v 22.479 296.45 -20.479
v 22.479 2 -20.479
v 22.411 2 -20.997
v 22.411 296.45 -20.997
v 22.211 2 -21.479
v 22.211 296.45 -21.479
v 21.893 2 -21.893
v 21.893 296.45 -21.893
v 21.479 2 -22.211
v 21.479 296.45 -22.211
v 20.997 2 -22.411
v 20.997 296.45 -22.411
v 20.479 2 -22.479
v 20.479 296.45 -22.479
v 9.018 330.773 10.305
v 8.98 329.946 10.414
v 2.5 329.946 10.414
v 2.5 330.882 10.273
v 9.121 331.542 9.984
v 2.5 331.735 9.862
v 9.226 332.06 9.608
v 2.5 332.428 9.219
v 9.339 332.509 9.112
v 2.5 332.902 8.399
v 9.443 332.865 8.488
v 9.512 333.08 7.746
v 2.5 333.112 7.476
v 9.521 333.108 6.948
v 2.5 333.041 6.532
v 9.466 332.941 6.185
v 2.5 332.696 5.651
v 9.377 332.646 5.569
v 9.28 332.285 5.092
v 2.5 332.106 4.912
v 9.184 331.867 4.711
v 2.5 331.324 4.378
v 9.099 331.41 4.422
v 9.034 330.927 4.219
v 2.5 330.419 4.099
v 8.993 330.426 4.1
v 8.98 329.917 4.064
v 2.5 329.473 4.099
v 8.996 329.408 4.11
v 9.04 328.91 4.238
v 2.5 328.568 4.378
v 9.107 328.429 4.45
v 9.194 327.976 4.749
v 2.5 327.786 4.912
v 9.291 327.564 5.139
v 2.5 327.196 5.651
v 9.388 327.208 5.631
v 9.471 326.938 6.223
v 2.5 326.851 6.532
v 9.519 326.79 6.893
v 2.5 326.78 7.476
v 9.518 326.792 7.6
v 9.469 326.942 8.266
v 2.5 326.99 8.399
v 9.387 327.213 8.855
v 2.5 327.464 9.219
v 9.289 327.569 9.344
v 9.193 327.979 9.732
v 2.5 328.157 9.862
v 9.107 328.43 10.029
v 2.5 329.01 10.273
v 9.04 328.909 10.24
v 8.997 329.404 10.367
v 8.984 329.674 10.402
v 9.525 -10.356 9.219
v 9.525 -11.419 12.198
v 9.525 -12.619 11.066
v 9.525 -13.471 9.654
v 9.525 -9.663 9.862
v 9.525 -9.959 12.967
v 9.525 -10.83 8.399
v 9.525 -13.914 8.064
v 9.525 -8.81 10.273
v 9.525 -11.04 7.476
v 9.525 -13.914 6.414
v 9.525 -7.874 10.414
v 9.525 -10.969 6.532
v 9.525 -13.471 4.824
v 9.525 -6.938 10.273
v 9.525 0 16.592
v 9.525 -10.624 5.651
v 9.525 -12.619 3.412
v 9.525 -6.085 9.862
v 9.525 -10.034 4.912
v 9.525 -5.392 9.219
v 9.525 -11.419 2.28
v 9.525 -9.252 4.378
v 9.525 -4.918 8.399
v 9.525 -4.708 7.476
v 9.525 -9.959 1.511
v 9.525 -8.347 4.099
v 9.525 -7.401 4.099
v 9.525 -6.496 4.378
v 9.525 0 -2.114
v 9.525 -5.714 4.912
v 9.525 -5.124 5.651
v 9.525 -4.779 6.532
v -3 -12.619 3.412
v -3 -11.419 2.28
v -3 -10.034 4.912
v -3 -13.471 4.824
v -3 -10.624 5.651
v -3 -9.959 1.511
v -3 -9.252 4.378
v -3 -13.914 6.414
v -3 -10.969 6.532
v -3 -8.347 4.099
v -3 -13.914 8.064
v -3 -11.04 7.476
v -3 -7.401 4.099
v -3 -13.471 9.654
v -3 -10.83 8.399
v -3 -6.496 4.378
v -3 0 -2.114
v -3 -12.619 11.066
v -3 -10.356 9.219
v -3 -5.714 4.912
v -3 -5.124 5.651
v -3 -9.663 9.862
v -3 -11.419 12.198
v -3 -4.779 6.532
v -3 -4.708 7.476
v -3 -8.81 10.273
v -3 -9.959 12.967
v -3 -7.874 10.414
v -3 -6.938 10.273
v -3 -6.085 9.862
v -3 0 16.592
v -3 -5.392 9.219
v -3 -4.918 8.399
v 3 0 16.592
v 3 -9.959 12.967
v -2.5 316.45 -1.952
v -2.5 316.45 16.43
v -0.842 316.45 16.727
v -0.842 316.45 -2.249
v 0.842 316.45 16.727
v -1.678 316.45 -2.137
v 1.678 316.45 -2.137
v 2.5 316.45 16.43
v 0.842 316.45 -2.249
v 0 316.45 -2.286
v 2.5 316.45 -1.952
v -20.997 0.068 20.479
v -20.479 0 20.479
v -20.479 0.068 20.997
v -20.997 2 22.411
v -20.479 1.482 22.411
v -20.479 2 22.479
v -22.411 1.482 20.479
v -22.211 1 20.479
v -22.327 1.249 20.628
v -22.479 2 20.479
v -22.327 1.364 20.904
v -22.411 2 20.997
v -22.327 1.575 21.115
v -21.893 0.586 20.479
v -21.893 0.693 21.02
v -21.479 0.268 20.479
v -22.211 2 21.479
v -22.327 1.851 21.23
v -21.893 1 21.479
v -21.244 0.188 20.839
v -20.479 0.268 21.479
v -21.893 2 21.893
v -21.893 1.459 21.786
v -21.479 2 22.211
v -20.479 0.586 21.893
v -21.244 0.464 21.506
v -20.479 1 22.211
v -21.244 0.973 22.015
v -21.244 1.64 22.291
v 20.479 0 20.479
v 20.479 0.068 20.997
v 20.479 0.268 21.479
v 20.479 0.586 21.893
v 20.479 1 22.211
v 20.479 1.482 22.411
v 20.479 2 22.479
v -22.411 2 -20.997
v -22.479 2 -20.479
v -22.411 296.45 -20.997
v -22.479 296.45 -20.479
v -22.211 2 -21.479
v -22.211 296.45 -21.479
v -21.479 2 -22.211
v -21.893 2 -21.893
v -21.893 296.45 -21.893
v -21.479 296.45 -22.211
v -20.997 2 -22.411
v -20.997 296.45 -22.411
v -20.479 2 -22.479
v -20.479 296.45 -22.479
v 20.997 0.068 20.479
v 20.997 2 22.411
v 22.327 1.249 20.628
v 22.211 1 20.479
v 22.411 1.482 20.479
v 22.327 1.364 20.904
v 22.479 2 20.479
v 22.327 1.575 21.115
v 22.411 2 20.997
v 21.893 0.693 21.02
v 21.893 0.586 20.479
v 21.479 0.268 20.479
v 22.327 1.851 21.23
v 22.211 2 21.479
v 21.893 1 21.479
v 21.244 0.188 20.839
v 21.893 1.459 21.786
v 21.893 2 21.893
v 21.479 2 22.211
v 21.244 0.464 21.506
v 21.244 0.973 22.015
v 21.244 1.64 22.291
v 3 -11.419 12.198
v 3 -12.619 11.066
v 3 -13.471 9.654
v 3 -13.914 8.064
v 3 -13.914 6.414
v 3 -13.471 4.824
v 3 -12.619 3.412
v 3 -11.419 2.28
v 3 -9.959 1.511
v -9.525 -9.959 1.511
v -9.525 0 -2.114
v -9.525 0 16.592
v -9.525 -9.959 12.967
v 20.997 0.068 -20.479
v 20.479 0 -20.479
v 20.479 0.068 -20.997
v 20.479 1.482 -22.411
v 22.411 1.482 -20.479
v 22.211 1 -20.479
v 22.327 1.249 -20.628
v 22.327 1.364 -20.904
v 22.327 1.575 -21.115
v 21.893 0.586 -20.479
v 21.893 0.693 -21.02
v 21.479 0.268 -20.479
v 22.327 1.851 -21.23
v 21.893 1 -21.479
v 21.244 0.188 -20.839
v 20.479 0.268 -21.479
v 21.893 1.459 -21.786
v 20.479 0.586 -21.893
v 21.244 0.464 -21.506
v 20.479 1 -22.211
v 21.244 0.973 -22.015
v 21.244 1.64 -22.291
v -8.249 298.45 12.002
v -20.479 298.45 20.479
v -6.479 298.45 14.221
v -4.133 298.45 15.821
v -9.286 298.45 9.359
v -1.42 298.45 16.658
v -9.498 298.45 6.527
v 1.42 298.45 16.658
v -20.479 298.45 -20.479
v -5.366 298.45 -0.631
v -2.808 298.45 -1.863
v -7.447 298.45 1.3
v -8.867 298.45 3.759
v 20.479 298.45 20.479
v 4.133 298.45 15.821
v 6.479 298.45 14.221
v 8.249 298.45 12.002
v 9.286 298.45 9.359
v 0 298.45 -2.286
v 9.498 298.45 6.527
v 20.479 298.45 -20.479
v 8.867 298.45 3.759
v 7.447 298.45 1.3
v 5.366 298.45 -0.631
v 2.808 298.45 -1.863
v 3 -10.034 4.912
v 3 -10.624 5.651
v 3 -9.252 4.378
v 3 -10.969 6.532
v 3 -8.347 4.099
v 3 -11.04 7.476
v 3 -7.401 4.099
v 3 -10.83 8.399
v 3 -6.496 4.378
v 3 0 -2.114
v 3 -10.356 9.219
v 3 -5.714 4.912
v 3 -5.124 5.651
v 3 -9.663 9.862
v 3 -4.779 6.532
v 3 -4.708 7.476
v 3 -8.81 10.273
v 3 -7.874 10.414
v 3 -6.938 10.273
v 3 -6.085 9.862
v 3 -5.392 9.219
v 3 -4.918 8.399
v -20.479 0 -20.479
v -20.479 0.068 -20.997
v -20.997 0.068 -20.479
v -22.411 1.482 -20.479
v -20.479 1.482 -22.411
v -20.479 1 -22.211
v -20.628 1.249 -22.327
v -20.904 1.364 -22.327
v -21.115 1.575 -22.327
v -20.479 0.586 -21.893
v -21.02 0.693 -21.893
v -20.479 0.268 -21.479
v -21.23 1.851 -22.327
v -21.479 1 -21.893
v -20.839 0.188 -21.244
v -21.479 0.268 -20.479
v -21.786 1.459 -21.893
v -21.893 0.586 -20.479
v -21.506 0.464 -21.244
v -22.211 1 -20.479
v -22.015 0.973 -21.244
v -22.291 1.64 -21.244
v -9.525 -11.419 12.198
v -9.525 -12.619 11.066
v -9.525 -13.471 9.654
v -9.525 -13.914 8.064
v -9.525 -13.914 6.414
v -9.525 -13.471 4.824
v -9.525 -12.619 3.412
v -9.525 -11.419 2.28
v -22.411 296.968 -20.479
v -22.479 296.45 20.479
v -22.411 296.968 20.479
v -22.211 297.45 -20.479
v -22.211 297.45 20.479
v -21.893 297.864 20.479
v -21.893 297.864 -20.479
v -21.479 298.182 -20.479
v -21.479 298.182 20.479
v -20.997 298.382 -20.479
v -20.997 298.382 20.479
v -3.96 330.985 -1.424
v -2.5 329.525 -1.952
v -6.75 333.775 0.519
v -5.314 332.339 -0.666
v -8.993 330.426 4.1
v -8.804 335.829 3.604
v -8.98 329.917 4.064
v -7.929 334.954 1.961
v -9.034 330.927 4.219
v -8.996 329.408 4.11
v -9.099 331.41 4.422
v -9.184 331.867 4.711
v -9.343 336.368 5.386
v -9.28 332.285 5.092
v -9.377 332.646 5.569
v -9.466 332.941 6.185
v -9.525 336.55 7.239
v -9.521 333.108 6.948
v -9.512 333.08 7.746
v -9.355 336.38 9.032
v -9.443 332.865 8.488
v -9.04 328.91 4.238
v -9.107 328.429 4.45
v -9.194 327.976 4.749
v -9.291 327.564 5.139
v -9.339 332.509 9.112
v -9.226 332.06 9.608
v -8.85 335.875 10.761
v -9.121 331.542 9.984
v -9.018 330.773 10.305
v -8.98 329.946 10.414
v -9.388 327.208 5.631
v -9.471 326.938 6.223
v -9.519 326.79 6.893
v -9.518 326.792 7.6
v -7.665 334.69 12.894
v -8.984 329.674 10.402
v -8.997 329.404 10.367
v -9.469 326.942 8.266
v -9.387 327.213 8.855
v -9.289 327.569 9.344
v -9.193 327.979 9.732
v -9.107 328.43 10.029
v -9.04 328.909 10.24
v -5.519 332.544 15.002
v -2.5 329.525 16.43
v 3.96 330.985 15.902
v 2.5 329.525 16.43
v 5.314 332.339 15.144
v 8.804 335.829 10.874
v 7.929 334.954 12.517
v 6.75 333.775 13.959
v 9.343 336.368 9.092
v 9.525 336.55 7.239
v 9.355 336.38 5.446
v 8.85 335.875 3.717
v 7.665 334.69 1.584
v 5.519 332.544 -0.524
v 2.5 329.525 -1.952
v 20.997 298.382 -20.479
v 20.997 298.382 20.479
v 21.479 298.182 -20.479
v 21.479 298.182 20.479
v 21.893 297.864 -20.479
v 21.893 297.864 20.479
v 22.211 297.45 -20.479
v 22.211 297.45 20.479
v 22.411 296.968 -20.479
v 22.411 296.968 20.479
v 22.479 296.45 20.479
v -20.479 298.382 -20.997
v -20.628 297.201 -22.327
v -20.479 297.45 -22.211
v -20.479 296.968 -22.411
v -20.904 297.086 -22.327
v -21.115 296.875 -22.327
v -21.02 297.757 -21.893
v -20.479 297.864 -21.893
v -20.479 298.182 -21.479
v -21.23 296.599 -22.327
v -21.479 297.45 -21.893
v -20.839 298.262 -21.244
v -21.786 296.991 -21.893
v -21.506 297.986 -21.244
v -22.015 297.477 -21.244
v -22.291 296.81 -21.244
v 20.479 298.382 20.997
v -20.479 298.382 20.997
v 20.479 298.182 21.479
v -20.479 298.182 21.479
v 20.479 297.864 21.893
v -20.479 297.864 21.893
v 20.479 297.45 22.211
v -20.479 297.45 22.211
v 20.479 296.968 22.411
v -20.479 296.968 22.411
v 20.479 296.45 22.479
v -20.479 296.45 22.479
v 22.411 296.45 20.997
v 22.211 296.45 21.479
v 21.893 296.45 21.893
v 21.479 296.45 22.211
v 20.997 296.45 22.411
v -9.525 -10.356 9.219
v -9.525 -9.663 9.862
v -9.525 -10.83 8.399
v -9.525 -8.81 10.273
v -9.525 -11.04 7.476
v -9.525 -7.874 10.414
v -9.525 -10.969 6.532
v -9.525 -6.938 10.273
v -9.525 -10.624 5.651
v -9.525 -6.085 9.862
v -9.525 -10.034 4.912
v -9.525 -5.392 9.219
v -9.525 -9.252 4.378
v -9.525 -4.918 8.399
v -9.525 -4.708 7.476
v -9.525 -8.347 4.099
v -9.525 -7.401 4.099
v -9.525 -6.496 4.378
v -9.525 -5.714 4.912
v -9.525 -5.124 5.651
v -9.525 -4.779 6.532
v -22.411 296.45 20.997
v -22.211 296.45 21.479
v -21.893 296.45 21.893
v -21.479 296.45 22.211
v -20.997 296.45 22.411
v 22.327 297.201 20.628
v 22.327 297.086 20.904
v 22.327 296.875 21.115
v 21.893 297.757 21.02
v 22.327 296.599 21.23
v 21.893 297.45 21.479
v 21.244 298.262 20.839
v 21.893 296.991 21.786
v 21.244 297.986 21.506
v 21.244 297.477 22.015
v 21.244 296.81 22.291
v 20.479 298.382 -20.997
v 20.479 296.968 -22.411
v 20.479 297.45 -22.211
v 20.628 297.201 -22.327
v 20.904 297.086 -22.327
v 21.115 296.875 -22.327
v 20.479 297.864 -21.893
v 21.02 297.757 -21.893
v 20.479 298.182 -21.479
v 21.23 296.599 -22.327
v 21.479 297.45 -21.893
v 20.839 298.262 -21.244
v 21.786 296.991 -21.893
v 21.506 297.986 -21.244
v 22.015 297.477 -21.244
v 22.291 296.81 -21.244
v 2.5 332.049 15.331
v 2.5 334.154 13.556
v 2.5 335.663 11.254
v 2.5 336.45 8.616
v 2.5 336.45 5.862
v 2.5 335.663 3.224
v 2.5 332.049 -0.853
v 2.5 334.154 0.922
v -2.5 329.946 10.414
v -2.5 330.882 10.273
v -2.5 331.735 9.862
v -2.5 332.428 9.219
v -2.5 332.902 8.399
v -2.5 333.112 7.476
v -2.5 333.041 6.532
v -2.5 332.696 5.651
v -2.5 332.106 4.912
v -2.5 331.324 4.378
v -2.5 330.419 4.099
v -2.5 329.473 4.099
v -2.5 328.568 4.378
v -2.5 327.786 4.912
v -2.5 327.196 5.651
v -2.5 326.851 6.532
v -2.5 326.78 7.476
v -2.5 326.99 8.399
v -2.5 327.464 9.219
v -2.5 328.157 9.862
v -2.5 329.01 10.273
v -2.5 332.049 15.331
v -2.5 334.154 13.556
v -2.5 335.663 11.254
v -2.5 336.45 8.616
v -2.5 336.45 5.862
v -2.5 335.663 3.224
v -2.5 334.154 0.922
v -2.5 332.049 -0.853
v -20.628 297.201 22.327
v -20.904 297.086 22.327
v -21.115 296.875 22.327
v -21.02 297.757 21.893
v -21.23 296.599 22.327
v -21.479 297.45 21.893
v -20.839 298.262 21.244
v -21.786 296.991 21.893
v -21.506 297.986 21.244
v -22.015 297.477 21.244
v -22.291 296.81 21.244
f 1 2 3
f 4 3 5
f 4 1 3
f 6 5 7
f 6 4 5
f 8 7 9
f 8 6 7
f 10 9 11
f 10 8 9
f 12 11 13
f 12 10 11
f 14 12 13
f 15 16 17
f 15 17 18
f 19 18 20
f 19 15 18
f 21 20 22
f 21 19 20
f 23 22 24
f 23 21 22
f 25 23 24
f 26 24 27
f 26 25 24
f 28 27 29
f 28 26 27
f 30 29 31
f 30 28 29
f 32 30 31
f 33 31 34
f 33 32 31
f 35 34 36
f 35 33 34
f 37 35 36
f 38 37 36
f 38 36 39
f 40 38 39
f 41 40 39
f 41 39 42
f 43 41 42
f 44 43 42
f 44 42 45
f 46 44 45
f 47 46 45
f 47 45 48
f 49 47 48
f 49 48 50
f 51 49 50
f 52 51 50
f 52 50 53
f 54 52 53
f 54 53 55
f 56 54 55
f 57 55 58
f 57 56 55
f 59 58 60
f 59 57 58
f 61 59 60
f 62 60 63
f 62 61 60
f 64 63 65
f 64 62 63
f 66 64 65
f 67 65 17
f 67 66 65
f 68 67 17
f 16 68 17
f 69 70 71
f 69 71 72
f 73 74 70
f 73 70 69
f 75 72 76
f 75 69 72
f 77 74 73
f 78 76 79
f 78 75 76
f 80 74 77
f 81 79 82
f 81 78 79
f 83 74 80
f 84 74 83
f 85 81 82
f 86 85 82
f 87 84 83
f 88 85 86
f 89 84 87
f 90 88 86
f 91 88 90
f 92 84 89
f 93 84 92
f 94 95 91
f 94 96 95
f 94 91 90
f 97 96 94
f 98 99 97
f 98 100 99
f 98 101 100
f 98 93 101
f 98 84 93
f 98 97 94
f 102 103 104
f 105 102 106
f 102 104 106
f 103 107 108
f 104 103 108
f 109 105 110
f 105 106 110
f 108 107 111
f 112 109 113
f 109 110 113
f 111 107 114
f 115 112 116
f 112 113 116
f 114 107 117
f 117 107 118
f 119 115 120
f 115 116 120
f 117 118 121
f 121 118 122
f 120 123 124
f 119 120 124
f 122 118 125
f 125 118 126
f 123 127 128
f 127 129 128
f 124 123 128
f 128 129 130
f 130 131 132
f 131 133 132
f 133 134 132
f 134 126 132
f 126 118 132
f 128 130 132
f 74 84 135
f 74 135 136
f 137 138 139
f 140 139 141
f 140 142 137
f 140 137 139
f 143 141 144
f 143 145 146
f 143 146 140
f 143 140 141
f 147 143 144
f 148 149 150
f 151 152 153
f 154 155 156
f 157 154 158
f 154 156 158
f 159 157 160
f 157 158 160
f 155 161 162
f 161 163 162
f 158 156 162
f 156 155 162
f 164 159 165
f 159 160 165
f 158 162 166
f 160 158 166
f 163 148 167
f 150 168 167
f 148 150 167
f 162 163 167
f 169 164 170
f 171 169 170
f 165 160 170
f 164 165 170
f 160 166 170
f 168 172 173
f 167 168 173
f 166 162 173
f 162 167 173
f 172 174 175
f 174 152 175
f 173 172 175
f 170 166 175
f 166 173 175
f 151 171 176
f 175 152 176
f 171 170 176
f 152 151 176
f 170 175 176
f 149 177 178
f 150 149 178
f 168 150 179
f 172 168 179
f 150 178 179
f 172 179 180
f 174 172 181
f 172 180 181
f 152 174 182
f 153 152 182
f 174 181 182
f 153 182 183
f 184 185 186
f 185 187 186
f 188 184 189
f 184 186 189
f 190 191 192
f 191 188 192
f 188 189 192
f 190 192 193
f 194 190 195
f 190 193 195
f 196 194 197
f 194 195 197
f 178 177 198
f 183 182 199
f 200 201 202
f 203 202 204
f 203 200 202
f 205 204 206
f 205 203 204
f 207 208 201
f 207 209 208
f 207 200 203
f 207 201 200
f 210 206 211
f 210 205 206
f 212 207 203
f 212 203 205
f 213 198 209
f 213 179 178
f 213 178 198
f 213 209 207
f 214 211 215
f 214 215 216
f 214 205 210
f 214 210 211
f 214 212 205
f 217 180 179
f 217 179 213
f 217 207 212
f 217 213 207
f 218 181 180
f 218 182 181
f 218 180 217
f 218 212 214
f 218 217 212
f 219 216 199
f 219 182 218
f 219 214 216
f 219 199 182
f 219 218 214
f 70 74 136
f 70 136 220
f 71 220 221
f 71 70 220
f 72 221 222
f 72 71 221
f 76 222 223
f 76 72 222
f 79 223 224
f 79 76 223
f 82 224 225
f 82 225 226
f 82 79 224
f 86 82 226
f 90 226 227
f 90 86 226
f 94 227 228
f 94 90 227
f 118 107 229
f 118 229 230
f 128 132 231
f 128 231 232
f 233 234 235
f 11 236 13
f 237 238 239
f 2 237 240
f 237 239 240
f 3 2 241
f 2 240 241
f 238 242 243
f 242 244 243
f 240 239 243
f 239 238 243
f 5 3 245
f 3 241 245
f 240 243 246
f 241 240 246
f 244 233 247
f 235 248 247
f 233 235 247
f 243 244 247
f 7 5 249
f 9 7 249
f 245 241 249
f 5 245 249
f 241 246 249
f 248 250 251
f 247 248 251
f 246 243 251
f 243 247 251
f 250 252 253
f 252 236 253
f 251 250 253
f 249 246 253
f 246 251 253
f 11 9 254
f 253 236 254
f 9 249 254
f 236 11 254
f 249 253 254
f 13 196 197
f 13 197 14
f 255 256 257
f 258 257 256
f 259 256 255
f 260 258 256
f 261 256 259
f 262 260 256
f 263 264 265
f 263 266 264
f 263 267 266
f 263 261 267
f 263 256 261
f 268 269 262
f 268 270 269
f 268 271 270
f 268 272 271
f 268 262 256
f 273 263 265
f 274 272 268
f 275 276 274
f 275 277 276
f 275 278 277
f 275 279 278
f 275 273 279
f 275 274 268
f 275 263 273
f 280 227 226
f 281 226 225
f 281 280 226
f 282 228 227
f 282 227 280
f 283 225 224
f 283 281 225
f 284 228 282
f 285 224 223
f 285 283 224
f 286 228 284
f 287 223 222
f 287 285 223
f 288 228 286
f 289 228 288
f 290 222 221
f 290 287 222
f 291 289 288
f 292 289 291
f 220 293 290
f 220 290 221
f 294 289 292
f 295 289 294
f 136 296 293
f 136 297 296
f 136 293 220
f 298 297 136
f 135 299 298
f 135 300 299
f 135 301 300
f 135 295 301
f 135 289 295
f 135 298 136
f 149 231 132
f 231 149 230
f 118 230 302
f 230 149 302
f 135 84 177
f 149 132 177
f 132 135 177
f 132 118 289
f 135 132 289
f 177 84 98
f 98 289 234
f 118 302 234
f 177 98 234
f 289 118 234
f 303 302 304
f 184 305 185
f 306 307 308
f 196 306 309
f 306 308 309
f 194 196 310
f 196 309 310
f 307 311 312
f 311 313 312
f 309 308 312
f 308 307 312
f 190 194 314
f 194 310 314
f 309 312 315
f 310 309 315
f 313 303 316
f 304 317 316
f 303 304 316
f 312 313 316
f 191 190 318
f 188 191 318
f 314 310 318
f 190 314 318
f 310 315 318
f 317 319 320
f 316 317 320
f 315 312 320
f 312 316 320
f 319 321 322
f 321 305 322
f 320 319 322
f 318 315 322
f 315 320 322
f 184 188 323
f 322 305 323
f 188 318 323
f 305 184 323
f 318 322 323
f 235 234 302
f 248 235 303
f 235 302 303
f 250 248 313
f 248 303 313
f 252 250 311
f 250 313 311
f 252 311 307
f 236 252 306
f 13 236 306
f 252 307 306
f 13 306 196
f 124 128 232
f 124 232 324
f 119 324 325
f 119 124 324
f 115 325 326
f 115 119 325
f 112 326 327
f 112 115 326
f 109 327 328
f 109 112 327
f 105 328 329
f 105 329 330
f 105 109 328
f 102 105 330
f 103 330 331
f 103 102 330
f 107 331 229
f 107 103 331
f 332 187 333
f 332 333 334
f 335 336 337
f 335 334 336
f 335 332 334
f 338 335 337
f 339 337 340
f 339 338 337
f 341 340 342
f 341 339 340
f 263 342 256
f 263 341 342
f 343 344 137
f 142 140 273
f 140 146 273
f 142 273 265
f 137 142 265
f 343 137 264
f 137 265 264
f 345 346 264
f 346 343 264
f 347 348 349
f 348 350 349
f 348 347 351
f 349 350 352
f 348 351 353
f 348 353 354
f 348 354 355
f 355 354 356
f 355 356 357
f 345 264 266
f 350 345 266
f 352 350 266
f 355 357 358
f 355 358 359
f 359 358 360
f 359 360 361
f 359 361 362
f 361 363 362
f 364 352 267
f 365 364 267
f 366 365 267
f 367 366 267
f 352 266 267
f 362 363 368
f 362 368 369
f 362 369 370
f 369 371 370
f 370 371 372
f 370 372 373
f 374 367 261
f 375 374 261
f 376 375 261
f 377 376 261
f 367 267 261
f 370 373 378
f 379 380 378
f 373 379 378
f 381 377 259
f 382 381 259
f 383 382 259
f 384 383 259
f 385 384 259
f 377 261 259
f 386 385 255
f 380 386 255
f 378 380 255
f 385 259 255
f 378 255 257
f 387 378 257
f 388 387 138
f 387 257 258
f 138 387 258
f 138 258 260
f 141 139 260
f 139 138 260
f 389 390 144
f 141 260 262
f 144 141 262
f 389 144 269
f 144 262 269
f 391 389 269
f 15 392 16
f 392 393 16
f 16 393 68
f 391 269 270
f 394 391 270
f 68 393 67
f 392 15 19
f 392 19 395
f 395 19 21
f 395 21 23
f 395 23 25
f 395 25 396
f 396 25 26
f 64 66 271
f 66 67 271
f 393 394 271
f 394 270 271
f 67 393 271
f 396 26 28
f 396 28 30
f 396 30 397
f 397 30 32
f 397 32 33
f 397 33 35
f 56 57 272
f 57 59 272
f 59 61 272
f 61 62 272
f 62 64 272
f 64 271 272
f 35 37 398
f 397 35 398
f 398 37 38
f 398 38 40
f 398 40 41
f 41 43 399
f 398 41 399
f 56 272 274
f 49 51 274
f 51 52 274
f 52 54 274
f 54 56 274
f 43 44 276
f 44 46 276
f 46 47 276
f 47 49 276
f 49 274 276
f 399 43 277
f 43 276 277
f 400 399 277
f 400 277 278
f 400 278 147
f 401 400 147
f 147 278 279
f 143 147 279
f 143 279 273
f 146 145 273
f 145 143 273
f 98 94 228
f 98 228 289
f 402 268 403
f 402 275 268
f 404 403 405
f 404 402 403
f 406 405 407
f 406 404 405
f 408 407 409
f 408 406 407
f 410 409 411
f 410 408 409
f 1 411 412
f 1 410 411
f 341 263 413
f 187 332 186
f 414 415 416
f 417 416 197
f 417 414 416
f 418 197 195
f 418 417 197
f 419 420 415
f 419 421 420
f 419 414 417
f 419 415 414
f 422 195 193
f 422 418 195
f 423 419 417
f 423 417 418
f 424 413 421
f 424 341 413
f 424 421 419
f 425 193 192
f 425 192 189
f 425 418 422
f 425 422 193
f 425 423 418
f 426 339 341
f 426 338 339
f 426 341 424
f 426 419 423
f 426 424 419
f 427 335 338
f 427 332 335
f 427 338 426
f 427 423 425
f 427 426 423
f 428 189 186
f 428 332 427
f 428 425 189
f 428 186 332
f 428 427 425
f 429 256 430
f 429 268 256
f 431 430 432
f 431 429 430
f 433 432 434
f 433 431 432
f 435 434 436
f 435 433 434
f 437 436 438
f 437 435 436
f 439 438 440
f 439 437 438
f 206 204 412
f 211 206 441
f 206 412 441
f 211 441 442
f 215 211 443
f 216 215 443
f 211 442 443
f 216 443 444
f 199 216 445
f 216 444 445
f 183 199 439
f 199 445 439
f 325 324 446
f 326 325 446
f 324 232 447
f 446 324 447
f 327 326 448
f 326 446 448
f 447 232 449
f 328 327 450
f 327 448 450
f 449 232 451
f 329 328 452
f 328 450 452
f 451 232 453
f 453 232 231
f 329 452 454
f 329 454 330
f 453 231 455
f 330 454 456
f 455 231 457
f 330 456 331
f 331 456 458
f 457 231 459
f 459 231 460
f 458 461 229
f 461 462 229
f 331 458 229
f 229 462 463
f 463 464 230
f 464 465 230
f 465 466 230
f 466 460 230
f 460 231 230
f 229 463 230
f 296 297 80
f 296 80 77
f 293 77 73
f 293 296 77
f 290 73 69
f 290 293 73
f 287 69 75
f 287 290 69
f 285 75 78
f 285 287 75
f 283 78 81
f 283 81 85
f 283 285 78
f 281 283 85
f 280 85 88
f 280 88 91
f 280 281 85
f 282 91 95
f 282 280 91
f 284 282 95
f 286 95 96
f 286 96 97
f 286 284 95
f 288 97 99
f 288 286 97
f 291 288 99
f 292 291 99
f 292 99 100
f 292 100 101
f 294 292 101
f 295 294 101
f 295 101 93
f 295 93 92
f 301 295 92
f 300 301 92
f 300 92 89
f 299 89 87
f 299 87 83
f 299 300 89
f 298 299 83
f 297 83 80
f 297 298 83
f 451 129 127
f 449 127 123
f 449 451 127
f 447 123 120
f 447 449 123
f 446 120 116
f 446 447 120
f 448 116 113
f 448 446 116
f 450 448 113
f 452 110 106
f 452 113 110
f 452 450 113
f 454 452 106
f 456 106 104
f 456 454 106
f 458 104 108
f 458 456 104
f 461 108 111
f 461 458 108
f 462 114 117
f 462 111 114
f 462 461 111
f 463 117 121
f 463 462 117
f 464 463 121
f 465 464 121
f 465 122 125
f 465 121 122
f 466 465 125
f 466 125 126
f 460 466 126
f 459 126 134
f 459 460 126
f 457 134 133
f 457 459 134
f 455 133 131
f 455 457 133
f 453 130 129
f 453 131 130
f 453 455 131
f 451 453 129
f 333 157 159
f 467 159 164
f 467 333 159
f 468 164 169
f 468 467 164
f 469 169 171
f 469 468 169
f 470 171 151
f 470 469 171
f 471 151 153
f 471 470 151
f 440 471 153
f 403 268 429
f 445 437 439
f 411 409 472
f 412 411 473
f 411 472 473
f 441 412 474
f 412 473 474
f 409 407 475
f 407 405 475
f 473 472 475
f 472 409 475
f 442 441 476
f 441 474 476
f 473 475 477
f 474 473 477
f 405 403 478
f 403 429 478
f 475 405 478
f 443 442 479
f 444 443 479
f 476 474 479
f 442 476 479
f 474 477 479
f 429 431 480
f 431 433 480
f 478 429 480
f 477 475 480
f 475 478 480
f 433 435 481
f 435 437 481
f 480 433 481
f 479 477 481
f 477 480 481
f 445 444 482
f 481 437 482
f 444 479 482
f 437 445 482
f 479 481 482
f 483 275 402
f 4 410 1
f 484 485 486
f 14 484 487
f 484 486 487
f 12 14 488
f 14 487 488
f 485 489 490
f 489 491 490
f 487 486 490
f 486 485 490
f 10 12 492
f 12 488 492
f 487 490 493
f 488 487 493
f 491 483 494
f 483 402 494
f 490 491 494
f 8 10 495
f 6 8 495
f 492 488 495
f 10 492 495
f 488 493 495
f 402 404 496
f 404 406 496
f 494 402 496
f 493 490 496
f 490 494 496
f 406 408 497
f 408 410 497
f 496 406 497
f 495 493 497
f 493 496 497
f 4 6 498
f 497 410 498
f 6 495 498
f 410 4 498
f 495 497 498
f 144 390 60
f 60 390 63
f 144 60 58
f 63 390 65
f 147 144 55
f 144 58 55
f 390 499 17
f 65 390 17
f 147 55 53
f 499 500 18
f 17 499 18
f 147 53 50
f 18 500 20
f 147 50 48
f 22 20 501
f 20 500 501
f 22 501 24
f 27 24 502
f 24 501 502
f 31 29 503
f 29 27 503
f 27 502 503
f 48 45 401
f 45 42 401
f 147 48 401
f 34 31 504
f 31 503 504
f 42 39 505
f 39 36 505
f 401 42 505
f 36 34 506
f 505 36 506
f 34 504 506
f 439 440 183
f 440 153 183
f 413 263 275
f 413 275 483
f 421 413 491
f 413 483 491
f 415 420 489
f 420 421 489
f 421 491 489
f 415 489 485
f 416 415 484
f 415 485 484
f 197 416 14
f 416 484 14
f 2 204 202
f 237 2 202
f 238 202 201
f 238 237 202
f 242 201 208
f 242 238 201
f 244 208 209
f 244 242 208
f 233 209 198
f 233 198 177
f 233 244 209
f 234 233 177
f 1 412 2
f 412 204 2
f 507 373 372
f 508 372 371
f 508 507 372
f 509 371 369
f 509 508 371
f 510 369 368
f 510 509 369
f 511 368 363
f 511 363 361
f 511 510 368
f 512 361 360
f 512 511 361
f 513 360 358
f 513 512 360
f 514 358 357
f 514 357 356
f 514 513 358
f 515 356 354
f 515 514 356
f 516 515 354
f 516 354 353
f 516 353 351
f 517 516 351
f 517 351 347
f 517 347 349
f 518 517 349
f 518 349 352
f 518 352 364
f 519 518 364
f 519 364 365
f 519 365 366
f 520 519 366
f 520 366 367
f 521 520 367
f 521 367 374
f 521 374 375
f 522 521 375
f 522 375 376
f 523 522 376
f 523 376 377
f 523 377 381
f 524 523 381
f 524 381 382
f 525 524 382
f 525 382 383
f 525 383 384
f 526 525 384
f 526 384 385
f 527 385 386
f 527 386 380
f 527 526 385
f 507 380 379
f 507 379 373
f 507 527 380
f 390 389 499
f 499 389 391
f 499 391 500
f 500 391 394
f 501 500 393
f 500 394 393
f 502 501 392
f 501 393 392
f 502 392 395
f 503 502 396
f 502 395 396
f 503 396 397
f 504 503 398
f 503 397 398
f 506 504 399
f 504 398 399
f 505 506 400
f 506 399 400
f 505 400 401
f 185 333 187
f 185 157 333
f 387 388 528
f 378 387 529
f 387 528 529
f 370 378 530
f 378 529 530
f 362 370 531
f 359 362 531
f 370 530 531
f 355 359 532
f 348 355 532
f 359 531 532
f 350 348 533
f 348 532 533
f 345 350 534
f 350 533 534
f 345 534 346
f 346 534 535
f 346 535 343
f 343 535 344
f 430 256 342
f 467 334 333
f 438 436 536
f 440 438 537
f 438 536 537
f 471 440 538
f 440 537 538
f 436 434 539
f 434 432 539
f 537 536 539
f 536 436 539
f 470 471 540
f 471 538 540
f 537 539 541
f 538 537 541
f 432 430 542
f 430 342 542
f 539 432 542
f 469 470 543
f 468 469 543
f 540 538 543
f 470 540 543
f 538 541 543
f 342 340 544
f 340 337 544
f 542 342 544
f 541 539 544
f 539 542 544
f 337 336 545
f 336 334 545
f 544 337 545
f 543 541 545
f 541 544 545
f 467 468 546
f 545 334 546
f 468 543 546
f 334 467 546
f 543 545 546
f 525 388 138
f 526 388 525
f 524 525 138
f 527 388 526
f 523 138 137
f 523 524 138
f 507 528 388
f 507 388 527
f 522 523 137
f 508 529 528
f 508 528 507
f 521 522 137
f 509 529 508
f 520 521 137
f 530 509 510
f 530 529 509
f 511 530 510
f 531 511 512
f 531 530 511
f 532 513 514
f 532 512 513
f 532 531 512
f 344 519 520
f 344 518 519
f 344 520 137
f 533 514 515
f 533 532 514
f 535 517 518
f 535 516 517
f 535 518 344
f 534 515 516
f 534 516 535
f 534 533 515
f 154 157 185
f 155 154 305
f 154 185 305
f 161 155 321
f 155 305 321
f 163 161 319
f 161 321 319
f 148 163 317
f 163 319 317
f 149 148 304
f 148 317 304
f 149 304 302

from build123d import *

# Parameters (mm, degrees)
SKETCH1_W               = 44.958
SKETCH1_H               = 44.958
BOSS_EXTRUDE1_DEPTH     = 298.45
SKETCH2_R               = 9.525
BOSS_EXTRUDE2_DEPTH     = 38.1
CUT_EXTRUDE1_DEPTH      = 341.282867193
CUT_EXTRUDE1_DEPTH_BACK = 341.282867193
CUT_EXTRUDE2_DEPTH      = 341.282867193
CUT_EXTRUDE2_DEPTH_BACK = 341.282867193
SKETCH4_R               = 3.175
SKETCH5_W               = 5
SKETCH5_H               = 20
CUT_EXTRUDE3_DEPTH      = 32
SKETCH6_R               = 3.175
BOSS_EXTRUDE3_DEPTH     = 9.525
SKETCH7_W               = 6
SKETCH7_H               = 44.958
CUT_EXTRUDE4_DEPTH      = 19.05
FILLET1_R               = 2


with BuildPart() as part:
    # Sketch1 → Boss-Extrude1 (new body)
    with BuildSketch(Plane(origin=(0, 0, 0), x_dir=(1, 0, 0), z_dir=(0, 1, 0))):
        Rectangle(SKETCH1_W, SKETCH1_H)
    extrude(amount=BOSS_EXTRUDE1_DEPTH)

    # Sketch2 → Boss-Extrude2 (add)
    with BuildSketch(Plane(origin=(0, 298.45, 0), x_dir=(1, 0, 0), z_dir=(0, 1, 0))):
        with Locations(Location((0, -7.239, 0), (0, 0, 90))):
            Circle(SKETCH2_R)
    extrude(amount=BOSS_EXTRUDE2_DEPTH)

    # Sketch3 → Cut-Extrude1 (cut, two sides: drawn at the far end of the back side and taken through both)
    with BuildSketch(Plane.ZY.offset(22.479).offset(-CUT_EXTRUDE1_DEPTH_BACK)):
        with BuildLine():
            Line((-2.286, 327.025), (-2.286, 352.425))
            Line((-2.286, 352.425), (16.764, 352.425))
            Line((16.764, 352.425), (16.764, 327.025))
            ThreePointArc((16.764, 327.025), (7.239, 336.55), (-2.286, 327.025))
        make_face()
    extrude(amount=CUT_EXTRUDE1_DEPTH + CUT_EXTRUDE1_DEPTH_BACK, mode=Mode.SUBTRACT)

    # Sketch4 → Cut-Extrude2 (cut, two sides: drawn at the far end of the back side and taken through both)
    with BuildSketch(Plane.ZY.offset(22.479).offset(-CUT_EXTRUDE2_DEPTH_BACK)):
        with Locations((7.239, 329.946)):
            Circle(SKETCH4_R)
    extrude(amount=CUT_EXTRUDE2_DEPTH + CUT_EXTRUDE2_DEPTH_BACK, mode=Mode.SUBTRACT)

    # Sketch5 → Cut-Extrude3 (cut)
    with BuildSketch(Plane(origin=(0, 348.45, 0), x_dir=(1, 0, 0), z_dir=(0, 1, 0))):
        with Locations((0, -7.239)):
            Rectangle(SKETCH5_W, SKETCH5_H)
    extrude(amount=-CUT_EXTRUDE3_DEPTH, mode=Mode.SUBTRACT)

    # Sketch6 → Boss-Extrude3 (add, symmetric)
    with BuildSketch(Plane(origin=(0, 0, 0), x_dir=(0, 0, -1), z_dir=(1, 0, 0))):
        with BuildLine():
            Line((2.114129326, 0), (-16.592129326, 0))
            Line((-16.592129326, 0), (-12.967366216, -9.958954794))
            ThreePointArc((-12.967366216, -9.958954794), (-7.239, -13.97), (-1.510633784, -9.958954794))
            Line((-1.510633784, -9.958954794), (2.114129326, 0))
        make_face()
        with Locations(Location((-7.239, -7.874, 0), (0, 0, 180))):
            Circle(SKETCH6_R, mode=Mode.SUBTRACT)
    extrude(amount=BOSS_EXTRUDE3_DEPTH, both=True)

    # Sketch7 → Cut-Extrude4 (cut)
    with BuildSketch(Plane.XZ):
        Rectangle(SKETCH7_W, SKETCH7_H)
    extrude(amount=CUT_EXTRUDE4_DEPTH, mode=Mode.SUBTRACT)

    # Fillet1
    fillet1_edges = [part.edges().sort_by_distance(p)[0] for p in [
        (-22.479, 298.45, 0),
        (0, 298.45, 22.479),
        (22.479, 298.45, 0),
        (0, 0, 22.479),
        (-22.479, 0, 0),
        (0, 0, -22.479),
        (22.479, 0, 0),
        (0, 298.45, -22.479),
        (22.479, 149.225, 22.479),
        (-22.479, 149.225, 22.479),
        (-22.479, 149.225, -22.479),
        (22.479, 149.225, -22.479),
    ]]
    fillet(fillet1_edges, radius=FILLET1_R)


solid = part.part
